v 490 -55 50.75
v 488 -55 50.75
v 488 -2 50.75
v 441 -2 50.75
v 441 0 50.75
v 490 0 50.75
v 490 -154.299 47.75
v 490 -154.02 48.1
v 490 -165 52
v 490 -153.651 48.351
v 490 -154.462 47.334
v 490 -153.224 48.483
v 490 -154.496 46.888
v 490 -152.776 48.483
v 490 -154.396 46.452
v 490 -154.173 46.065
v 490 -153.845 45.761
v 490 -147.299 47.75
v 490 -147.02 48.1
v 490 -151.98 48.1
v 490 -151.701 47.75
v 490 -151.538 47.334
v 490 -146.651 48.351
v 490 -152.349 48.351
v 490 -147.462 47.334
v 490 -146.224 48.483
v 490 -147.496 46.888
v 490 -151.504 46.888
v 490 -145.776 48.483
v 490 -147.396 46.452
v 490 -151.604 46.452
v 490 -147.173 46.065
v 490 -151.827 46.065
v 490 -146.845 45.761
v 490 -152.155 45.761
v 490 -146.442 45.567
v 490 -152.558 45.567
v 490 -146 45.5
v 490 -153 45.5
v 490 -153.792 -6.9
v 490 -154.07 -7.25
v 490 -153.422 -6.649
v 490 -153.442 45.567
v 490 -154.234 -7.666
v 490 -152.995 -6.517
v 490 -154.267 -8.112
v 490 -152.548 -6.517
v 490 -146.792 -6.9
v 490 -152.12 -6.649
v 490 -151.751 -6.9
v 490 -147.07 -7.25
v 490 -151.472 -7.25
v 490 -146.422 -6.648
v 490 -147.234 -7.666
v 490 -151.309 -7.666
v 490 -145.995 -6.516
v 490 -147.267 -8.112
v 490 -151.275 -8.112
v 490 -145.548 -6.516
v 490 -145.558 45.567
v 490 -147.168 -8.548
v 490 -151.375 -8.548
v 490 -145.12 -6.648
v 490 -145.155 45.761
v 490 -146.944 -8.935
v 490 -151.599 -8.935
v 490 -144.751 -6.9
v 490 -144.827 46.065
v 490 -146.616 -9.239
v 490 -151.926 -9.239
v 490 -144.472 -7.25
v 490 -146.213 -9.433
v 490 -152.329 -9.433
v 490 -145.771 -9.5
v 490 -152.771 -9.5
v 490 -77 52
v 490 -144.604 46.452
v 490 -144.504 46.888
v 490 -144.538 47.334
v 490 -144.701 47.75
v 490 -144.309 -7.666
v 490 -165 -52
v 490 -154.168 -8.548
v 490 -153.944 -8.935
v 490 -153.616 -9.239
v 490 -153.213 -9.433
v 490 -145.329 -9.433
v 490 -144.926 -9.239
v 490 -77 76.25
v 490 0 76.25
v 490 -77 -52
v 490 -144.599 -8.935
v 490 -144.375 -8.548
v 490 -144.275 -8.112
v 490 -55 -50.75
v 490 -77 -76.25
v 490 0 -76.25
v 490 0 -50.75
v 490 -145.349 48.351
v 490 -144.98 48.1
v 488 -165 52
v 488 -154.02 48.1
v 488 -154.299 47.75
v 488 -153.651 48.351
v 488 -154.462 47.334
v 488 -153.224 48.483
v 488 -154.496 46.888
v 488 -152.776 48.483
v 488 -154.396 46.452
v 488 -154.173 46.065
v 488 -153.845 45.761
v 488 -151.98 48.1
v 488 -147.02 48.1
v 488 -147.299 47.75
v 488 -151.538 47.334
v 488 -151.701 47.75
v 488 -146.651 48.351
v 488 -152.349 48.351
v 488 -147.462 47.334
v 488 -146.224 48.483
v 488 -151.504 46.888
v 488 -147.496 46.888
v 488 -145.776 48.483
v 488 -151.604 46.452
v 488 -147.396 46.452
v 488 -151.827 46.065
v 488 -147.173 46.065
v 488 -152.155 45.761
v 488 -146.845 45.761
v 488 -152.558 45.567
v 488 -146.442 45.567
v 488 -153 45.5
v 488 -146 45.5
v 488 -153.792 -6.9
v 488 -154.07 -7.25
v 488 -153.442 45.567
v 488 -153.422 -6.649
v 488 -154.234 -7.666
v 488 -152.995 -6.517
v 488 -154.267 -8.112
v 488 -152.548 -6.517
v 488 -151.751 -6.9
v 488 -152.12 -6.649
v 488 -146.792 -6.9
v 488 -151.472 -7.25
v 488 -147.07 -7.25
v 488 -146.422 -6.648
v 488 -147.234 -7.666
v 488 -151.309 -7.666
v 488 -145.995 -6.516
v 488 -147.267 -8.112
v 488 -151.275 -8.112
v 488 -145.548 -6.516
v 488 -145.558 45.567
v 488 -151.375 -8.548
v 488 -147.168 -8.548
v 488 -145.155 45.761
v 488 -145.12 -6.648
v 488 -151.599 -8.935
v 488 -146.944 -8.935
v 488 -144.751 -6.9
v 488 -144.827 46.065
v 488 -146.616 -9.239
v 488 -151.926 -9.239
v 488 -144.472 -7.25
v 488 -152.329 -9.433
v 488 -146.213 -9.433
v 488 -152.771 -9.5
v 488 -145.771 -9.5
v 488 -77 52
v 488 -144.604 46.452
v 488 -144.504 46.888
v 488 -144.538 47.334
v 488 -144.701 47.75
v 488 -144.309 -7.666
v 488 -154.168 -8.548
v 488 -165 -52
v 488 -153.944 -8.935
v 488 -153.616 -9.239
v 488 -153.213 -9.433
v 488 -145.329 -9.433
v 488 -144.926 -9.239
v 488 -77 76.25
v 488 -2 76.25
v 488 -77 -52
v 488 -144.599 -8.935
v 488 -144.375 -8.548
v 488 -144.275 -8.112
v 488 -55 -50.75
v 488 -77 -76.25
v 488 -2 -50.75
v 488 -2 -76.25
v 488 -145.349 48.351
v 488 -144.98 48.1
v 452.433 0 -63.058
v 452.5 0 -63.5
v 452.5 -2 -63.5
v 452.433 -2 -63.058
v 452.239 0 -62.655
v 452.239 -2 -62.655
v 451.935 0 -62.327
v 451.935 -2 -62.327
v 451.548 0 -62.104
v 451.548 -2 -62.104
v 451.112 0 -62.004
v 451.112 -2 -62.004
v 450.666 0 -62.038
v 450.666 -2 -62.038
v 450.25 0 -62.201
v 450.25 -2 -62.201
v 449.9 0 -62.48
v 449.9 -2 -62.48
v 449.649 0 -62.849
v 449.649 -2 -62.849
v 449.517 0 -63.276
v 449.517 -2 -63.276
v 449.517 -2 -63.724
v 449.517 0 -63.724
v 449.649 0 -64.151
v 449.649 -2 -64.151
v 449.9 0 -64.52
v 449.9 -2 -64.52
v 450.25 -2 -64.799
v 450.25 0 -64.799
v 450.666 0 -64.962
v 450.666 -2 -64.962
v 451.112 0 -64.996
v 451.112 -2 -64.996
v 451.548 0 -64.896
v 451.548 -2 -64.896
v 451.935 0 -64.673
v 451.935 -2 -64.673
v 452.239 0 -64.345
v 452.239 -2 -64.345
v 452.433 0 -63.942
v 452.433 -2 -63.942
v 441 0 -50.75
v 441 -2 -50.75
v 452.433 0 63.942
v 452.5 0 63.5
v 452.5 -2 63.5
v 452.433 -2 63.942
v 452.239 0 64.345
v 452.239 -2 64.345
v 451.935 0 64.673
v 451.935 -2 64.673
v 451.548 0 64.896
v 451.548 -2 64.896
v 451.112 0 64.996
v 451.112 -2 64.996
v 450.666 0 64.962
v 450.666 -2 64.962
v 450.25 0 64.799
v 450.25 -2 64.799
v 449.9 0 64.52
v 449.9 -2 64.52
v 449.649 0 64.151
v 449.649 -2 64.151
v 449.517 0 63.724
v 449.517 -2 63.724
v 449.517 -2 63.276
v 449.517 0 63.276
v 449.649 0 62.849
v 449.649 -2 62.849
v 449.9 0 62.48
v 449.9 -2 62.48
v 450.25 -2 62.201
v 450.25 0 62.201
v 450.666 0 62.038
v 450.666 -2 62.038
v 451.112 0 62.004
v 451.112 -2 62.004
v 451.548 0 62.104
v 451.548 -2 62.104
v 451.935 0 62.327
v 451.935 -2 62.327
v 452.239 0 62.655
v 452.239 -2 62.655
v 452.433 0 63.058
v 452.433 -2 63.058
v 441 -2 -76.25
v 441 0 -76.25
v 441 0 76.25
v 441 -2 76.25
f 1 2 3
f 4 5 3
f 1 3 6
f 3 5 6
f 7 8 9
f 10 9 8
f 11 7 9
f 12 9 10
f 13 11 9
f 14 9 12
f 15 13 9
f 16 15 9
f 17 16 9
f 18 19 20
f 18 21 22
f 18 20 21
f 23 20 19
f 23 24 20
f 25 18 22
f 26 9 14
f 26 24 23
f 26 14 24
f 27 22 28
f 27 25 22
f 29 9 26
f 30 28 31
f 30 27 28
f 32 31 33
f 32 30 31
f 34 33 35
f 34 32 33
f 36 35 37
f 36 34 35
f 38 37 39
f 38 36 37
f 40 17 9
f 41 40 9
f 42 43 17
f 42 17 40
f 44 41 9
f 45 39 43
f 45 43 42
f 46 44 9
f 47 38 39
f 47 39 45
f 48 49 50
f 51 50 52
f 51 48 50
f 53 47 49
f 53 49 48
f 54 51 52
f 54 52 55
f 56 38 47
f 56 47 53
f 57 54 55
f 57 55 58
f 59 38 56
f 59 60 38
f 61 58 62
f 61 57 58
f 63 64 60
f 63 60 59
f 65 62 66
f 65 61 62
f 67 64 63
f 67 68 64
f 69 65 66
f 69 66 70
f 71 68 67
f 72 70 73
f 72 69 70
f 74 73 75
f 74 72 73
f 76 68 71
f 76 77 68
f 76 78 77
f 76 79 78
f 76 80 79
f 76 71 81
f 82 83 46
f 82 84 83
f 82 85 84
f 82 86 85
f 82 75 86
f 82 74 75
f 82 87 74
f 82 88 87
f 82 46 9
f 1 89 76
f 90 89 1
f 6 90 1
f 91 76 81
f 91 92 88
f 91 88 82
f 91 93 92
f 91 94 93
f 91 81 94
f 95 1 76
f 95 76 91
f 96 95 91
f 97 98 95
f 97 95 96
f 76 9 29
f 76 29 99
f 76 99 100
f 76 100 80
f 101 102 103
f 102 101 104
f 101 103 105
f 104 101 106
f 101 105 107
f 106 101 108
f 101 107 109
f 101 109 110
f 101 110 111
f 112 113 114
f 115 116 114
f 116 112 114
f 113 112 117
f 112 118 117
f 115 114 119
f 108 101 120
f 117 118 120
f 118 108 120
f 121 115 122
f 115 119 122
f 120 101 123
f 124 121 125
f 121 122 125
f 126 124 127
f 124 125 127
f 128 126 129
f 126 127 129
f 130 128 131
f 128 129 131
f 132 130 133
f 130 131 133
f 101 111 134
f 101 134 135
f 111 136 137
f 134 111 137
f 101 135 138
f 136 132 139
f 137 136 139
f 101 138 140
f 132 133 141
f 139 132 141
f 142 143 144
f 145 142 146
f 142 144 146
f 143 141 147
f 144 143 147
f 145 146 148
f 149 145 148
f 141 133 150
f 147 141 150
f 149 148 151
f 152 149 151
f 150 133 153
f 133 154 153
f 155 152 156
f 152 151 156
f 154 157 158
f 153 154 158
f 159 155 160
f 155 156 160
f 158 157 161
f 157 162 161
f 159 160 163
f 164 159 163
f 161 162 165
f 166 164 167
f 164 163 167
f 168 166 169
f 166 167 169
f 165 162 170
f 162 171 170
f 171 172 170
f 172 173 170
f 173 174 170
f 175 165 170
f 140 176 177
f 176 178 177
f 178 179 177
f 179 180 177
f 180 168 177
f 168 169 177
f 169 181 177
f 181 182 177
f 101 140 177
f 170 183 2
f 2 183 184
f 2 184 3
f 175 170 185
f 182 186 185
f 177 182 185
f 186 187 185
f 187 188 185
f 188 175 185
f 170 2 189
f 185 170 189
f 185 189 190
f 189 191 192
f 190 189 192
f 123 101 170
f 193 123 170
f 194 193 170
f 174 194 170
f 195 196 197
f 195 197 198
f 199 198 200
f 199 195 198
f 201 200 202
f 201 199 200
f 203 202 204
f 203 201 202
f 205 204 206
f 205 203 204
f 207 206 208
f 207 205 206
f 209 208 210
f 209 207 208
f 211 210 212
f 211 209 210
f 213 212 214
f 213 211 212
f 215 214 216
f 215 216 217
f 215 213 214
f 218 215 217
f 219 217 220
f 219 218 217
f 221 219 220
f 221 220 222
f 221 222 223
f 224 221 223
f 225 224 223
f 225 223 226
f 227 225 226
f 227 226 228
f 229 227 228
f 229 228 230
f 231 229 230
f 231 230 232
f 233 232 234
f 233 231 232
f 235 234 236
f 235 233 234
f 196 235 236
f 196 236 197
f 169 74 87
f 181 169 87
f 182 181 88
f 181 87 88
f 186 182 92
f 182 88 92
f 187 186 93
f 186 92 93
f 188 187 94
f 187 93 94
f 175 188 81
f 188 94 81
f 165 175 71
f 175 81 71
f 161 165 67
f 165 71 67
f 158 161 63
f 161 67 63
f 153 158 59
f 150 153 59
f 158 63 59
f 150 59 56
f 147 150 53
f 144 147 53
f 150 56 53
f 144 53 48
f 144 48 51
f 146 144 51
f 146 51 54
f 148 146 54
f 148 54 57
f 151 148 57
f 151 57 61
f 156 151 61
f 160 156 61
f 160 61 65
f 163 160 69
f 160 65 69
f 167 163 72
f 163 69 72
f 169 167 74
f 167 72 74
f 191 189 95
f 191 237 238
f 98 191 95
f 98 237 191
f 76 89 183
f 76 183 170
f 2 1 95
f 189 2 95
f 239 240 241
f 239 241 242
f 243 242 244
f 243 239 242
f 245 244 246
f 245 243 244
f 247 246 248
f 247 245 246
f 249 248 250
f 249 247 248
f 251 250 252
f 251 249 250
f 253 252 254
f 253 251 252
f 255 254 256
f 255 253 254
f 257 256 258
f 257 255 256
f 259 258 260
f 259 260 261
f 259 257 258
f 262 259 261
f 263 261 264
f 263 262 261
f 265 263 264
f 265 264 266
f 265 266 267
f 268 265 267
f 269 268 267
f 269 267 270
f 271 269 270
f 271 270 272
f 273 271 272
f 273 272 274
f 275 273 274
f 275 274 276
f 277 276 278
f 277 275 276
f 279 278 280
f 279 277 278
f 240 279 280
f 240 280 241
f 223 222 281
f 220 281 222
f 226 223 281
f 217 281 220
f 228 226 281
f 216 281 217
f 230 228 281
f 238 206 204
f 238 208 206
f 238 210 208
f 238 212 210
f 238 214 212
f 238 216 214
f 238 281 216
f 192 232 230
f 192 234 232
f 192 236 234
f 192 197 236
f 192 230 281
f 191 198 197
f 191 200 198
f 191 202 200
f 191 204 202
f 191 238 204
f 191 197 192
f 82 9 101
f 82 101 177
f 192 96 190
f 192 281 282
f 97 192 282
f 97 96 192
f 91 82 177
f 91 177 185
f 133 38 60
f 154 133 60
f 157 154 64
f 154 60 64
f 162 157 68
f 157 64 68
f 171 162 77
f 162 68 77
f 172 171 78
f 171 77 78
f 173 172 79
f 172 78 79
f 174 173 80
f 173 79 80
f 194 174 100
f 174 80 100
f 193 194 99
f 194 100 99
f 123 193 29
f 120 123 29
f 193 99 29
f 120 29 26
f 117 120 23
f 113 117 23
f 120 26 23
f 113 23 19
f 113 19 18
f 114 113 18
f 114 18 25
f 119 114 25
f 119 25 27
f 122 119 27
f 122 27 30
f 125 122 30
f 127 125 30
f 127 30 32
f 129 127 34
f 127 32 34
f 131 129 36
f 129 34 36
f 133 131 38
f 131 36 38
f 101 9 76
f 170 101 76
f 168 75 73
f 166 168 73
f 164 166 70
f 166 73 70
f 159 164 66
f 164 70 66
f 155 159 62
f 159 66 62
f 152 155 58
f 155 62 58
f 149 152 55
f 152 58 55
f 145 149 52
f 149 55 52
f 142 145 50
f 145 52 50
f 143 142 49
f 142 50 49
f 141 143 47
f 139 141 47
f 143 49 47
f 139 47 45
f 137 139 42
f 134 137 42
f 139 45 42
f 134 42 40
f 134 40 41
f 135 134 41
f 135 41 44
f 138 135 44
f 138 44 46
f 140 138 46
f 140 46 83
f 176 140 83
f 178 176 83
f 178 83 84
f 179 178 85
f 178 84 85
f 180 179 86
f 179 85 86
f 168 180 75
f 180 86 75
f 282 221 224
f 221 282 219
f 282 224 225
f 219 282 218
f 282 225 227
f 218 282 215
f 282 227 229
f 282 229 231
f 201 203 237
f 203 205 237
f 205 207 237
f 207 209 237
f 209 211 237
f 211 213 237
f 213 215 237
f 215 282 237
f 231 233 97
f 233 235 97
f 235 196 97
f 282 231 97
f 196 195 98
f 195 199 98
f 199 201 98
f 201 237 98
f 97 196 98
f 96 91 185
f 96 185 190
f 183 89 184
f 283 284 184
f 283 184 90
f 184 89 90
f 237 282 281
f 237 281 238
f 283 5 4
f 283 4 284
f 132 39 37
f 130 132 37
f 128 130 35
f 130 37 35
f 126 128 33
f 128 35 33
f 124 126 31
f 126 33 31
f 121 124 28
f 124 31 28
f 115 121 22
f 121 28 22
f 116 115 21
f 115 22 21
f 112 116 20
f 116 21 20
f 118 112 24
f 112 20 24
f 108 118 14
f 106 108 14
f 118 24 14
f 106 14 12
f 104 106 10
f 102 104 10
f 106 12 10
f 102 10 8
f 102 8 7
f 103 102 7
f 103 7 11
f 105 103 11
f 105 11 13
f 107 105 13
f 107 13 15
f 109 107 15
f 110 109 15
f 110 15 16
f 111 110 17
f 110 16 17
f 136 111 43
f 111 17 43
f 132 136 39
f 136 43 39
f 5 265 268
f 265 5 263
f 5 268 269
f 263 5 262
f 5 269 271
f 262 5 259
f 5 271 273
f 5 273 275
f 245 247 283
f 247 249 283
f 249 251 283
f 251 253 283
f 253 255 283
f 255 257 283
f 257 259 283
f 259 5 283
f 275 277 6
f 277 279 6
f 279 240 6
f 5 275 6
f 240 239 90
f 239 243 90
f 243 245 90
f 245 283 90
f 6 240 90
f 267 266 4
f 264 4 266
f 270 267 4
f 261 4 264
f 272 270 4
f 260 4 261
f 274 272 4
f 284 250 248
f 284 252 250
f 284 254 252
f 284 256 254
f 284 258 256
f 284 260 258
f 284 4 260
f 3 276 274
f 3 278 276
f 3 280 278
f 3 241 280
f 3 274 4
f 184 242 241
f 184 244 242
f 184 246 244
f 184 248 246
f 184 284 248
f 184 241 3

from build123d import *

# Parameters (mm, degrees)
SKETCH2_W             = 49
SKETCH2_H             = 25.5
SKETCH2_R             = 1.5
BOSS_EXTRUDE1_DEPTH   = 2
BOSS_EXTRUDE1_2_DEPTH = 2
SKETCH3_W             = 2
SKETCH3_H             = 25.5
BOSS_EXTRUDE2_DEPTH   = 53
SKETCH4_W             = 152.5
SKETCH4_H             = 22
SKETCH4_W_2           = 104
SKETCH4_H_2           = 88
SKETCH4_R             = 1.5
BOSS_EXTRUDE3_DEPTH   = 2


with BuildPart() as part:
    # Sketch2 → Boss-Extrude1 (new body)
    with BuildSketch(Plane.XZ):
        with Locations((465.5, -63.5)):
            Rectangle(SKETCH2_W, SKETCH2_H)
        with Locations((451, -63.5)):
            Circle(SKETCH2_R, mode=Mode.SUBTRACT)
    extrude(amount=BOSS_EXTRUDE1_DEPTH)



with BuildPart() as body_2:
    # Sketch2 → Boss-Extrude1 2 (new body)
    with BuildSketch(Plane.XZ):
        with Locations((465.5, 63.5)):
            Rectangle(SKETCH2_W, SKETCH2_H)
        with Locations((451, 63.5)):
            Circle(SKETCH2_R, mode=Mode.SUBTRACT)
    extrude(amount=BOSS_EXTRUDE1_2_DEPTH)


with BuildPart() as part_1:
    add(part.part)

    add(body_2.part)  # Boss-Extrude2 merges body 2
    # Sketch3 → Boss-Extrude2 (add)
    with BuildSketch(Plane.XZ.offset(2)):
        with Locations((489, 63.5)):
            Rectangle(SKETCH3_W, SKETCH3_H)
        with Locations((489, -63.5)):
            Rectangle(SKETCH3_W, SKETCH3_H)
    extrude(amount=BOSS_EXTRUDE2_DEPTH)

    # Sketch4 → Boss-Extrude3 (add)
    with BuildSketch(Plane(origin=(490, 0, 0), x_dir=(0, 0, -1), z_dir=(1, 0, 0))):
        with Locations((0, -66)):
            Rectangle(SKETCH4_W, SKETCH4_H)
        with Locations((0, -121)):
            Rectangle(SKETCH4_W_2, SKETCH4_H_2)
        with Locations((-47, -146)):
            Circle(SKETCH4_R, mode=Mode.SUBTRACT)
        with Locations((-47, -153)):
            Circle(SKETCH4_R, mode=Mode.SUBTRACT)
        with Locations((7.999524512, -145.771300426)):
            Circle(SKETCH4_R, mode=Mode.SUBTRACT)
        with Locations((8, -152.77130041)):
            Circle(SKETCH4_R, mode=Mode.SUBTRACT)
    extrude(amount=-BOSS_EXTRUDE3_DEPTH)


solid = part_1.part
